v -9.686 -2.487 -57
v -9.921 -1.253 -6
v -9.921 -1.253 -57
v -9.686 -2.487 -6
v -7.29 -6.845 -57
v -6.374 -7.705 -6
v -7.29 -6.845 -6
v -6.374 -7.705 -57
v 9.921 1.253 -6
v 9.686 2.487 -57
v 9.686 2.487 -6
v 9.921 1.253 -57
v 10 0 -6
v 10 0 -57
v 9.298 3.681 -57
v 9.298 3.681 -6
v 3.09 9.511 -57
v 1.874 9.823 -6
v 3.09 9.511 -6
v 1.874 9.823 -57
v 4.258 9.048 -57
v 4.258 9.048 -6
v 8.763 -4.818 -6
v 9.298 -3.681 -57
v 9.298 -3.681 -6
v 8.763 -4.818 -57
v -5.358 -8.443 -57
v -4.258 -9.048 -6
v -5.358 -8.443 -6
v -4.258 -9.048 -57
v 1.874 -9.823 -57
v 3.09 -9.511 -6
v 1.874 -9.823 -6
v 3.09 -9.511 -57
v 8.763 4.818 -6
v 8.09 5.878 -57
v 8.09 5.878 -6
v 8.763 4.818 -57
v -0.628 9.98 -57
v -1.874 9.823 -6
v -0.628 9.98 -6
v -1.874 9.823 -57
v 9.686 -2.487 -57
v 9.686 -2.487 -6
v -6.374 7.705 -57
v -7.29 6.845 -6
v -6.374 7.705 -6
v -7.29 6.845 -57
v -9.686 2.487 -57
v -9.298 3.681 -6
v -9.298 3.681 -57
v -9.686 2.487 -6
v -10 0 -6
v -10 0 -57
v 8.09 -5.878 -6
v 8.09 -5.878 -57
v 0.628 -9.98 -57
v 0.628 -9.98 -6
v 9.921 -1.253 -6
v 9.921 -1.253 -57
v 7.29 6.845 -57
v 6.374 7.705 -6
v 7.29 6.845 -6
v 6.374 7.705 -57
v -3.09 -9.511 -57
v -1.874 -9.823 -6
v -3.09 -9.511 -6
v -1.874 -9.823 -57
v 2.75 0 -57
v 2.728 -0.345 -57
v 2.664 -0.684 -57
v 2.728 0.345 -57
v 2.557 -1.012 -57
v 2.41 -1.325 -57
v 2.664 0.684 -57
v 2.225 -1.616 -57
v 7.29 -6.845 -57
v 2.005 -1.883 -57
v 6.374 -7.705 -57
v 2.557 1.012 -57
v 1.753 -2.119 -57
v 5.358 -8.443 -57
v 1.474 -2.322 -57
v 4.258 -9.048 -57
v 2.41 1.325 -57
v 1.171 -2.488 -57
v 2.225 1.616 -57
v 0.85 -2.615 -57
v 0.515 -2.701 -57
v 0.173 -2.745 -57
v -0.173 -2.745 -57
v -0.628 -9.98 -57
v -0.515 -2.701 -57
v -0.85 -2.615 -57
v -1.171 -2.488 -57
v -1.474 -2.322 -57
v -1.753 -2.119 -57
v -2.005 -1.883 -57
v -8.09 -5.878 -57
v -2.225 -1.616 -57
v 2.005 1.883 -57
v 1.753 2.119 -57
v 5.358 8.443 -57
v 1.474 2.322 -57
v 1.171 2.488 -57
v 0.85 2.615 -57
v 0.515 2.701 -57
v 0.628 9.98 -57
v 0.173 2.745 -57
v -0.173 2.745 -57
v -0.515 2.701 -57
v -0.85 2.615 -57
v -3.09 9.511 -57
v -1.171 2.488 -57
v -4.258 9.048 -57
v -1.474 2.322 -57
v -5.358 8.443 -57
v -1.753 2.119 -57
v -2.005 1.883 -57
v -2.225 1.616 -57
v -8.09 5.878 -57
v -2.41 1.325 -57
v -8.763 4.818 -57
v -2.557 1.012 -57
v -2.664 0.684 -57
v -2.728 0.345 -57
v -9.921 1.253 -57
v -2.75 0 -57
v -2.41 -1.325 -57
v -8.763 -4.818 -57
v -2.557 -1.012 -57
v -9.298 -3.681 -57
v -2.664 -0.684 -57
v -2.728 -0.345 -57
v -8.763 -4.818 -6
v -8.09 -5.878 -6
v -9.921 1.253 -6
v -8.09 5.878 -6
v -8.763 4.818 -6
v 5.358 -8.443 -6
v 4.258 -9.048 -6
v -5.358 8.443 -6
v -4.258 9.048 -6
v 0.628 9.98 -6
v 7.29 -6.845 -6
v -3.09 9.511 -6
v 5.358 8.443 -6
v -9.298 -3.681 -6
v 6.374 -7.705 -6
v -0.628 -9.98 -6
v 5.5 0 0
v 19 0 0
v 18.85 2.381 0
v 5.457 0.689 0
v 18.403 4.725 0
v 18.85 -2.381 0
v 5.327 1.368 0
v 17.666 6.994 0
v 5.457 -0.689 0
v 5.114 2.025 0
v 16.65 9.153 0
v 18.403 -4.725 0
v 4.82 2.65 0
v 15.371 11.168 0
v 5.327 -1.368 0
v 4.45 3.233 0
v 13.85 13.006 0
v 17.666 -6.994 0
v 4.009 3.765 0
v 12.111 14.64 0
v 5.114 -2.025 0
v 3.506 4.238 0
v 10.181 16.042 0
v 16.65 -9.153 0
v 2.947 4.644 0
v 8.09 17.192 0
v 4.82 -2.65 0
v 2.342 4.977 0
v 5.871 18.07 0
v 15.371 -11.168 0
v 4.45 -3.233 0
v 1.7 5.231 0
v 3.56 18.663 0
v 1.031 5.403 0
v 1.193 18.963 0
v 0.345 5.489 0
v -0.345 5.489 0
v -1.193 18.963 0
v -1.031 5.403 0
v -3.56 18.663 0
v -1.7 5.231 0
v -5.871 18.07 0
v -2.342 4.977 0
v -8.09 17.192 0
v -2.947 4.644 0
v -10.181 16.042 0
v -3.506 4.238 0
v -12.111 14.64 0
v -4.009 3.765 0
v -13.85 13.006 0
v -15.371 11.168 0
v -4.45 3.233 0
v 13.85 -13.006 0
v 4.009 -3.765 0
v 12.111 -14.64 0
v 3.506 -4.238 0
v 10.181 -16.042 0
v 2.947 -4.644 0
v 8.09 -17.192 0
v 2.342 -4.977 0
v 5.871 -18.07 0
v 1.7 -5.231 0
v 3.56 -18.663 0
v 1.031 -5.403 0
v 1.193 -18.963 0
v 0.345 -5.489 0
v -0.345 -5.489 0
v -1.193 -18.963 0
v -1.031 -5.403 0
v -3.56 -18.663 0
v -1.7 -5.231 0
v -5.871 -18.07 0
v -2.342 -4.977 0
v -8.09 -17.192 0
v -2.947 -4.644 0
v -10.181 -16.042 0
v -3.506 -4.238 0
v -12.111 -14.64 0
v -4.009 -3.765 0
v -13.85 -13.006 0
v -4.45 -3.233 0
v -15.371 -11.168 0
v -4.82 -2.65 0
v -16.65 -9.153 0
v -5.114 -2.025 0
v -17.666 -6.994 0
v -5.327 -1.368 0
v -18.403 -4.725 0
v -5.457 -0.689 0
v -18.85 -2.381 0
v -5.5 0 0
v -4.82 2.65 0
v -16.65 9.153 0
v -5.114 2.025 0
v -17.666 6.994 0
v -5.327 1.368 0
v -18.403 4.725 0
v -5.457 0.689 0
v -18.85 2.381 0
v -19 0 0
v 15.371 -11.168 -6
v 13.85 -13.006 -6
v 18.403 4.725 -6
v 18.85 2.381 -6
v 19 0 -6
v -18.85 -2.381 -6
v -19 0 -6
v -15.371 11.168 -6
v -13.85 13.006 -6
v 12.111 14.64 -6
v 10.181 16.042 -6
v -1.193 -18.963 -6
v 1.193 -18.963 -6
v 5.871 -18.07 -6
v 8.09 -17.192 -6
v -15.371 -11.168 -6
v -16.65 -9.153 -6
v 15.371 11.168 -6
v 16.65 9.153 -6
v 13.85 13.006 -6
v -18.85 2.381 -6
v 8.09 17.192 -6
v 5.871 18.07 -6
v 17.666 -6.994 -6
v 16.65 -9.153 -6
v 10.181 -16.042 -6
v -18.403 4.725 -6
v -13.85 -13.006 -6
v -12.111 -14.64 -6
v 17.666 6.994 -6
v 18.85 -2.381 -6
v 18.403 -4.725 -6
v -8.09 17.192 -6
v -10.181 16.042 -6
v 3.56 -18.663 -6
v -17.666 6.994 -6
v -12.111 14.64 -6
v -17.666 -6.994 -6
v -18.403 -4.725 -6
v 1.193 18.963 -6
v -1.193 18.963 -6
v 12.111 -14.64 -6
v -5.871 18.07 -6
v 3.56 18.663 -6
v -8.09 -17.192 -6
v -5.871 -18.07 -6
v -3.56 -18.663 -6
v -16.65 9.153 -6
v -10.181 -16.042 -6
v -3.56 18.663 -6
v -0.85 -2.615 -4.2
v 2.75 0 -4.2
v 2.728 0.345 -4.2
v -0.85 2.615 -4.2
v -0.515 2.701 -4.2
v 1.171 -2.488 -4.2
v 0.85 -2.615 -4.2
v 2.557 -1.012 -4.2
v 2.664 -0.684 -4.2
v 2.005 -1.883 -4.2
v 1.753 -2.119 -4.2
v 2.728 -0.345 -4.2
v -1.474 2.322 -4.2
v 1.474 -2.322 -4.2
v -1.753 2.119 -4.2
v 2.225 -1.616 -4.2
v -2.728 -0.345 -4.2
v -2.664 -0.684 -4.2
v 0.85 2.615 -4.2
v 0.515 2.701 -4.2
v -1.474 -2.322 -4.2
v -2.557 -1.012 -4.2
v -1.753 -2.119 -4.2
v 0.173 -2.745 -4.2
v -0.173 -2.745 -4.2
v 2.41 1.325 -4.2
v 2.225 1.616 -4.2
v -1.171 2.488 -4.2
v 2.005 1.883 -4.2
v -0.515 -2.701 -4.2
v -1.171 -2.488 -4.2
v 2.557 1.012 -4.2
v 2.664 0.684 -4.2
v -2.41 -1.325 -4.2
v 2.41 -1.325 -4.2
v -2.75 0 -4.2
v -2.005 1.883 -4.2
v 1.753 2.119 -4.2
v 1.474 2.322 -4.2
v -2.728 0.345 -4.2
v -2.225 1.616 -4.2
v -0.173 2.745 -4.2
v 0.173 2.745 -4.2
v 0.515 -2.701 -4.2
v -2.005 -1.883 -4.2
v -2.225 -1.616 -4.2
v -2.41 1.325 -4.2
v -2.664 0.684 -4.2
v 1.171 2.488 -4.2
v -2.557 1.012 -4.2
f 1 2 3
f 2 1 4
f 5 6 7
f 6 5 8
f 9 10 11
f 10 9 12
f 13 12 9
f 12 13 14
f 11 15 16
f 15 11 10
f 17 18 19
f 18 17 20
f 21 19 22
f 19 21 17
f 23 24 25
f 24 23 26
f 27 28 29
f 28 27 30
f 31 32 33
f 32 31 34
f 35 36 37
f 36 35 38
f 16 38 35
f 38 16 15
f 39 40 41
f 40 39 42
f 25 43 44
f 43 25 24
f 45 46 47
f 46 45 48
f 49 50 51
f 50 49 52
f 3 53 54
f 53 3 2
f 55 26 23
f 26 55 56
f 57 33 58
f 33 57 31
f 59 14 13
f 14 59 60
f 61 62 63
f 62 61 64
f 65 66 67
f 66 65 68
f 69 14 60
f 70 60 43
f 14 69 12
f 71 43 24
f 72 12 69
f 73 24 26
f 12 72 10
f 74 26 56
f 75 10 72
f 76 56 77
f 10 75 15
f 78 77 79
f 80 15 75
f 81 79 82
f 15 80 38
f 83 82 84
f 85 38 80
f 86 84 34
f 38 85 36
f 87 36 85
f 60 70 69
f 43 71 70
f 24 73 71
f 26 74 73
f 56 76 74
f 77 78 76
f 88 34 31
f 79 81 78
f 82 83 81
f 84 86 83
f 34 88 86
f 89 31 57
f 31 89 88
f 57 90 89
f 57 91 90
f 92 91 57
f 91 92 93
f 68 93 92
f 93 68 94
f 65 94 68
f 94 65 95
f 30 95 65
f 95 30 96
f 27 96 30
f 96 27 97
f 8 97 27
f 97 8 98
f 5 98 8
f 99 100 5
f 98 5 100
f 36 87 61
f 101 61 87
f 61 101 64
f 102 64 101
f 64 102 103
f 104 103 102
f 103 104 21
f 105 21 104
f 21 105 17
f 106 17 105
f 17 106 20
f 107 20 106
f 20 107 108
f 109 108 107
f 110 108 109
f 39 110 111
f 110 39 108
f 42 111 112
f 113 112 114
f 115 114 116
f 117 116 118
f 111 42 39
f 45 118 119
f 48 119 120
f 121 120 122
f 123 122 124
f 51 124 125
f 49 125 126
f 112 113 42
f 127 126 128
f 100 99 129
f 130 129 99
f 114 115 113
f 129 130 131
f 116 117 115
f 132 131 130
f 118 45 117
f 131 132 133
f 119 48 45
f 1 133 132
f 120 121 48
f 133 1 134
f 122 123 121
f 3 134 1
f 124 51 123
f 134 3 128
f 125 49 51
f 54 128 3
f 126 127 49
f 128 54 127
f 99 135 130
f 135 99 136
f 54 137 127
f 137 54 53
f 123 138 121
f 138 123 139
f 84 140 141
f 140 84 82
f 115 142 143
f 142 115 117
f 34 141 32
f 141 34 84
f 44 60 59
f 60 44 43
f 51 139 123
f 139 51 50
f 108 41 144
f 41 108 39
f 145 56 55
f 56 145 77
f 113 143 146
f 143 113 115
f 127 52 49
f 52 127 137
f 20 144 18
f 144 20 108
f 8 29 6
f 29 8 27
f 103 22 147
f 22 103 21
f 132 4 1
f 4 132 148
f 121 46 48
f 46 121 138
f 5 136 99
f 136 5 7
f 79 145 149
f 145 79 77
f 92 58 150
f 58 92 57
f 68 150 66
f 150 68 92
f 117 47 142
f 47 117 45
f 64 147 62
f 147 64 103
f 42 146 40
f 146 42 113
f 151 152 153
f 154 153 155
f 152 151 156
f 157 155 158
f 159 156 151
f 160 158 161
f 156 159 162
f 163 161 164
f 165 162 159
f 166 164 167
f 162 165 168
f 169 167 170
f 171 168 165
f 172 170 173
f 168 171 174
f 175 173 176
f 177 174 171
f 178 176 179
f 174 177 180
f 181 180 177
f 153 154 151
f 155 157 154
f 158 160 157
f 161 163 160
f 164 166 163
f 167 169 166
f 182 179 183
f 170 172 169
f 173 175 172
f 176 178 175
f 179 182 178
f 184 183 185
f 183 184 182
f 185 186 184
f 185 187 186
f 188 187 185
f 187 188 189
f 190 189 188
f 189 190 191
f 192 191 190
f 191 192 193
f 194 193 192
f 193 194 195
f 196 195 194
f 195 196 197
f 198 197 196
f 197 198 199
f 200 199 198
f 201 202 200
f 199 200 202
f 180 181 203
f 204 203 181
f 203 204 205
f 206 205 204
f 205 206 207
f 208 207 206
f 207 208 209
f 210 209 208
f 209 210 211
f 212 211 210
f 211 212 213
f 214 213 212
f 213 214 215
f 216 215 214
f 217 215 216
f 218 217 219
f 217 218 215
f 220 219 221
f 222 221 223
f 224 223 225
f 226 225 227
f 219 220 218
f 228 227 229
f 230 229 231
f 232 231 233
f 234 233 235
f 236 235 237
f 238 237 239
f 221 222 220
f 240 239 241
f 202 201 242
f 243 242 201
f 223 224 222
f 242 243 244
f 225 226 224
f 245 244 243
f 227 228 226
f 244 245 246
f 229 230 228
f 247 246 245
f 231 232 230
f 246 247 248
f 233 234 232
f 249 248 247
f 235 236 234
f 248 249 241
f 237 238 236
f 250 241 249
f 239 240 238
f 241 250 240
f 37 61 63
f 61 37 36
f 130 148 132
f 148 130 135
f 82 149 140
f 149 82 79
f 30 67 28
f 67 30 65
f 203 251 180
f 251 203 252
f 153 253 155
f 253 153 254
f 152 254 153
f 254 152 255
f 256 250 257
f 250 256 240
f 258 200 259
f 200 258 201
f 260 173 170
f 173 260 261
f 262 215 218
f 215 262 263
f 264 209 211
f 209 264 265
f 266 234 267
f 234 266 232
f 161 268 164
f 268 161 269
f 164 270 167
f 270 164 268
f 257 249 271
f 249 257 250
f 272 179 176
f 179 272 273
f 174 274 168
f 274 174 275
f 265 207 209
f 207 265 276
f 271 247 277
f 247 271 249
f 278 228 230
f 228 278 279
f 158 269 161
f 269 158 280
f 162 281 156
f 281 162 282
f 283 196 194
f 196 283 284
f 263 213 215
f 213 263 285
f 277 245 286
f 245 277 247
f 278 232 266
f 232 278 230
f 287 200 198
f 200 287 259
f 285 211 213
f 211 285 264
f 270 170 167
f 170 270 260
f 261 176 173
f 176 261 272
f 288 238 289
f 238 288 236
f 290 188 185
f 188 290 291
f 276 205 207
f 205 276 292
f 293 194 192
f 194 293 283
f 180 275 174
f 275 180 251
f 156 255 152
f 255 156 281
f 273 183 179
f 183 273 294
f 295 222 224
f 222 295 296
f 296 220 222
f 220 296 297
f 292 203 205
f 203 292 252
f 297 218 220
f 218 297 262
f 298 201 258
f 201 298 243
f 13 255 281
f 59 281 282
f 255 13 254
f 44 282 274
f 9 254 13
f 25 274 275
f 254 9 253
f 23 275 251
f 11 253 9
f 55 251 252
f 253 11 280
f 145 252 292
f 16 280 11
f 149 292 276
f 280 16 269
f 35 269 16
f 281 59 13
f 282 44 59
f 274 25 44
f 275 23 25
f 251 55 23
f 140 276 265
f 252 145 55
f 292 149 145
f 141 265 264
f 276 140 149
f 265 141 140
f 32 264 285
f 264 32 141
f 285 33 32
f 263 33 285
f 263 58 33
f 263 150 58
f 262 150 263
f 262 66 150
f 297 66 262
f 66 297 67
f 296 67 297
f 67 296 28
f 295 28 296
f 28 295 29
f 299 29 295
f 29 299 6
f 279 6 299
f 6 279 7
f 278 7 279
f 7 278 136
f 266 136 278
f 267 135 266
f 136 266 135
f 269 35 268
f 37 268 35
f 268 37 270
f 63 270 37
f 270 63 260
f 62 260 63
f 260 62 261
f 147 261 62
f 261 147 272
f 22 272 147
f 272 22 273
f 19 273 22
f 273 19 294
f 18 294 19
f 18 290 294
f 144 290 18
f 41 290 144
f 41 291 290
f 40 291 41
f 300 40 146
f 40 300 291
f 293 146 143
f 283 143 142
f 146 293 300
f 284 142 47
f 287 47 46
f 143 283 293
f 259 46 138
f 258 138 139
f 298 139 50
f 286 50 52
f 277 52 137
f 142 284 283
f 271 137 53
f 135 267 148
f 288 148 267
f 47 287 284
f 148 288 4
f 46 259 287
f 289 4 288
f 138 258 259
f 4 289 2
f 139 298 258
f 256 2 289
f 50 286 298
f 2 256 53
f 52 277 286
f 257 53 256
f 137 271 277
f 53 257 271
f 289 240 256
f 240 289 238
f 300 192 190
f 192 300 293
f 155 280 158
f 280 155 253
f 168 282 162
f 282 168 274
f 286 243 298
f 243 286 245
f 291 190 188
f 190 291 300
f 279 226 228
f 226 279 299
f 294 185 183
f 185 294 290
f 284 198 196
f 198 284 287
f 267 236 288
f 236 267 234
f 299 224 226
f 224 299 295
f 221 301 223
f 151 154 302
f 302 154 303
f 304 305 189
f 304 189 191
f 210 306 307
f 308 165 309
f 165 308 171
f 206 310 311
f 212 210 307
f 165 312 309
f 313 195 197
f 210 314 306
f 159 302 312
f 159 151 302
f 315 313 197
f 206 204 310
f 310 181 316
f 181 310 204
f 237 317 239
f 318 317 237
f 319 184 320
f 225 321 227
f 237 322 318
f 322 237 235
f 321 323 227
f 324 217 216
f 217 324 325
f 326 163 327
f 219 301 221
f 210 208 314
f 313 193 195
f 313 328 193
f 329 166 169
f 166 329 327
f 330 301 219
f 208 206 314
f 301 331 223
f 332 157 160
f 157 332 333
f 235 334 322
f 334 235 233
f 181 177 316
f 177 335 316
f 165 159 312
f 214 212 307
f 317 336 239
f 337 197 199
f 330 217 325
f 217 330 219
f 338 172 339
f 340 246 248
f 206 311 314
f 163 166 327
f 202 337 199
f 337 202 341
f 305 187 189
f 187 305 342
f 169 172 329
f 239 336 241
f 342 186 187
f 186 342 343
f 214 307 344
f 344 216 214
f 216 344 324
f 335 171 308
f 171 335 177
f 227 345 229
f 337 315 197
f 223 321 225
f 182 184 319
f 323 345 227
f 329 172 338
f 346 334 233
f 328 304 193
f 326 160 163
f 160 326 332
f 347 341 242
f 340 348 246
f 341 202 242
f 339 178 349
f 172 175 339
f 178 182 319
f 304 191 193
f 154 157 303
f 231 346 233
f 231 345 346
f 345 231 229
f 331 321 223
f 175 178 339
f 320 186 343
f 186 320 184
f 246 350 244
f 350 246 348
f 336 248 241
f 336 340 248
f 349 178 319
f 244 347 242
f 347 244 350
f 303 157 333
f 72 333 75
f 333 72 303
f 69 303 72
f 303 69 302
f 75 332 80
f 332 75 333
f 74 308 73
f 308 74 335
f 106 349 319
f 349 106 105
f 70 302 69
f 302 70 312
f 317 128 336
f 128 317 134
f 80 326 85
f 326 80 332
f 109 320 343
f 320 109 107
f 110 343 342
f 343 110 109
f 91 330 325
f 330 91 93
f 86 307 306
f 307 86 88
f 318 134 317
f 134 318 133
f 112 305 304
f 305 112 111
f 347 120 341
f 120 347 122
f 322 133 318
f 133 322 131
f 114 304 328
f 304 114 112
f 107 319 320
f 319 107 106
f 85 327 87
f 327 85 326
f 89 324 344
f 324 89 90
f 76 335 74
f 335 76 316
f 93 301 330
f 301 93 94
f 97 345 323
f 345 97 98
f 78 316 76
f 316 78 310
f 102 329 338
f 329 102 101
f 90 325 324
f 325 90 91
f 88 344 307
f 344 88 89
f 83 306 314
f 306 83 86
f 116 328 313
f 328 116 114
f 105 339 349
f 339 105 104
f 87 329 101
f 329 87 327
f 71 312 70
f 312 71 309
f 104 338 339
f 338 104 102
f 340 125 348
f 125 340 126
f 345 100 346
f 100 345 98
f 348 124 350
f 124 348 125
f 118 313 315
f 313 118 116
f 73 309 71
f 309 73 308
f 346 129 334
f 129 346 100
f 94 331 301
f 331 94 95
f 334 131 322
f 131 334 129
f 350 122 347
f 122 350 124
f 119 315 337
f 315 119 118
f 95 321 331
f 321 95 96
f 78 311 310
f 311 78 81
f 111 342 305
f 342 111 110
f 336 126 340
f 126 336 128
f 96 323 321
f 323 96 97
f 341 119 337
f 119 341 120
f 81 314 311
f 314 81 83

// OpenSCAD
$fn = 50;


difference() {
	union() {
		translate(v = [0, 0, -57.0000000000]) {
			cylinder(h = 57, r = 10.0000000000);
		}
		translate(v = [0, 0, -6.0000000000]) {
			cylinder(h = 6, r = 19.0000000000);
		}
	}
	union() {
		translate(v = [0, 0, 0]) {
			rotate(a = [0, 0, 0]) {
				difference() {
					union() {
						#translate(v = [0, 0, -57.0000000000]) {
							cylinder(h = 57, r = 2.2500000000);
						}
						#translate(v = [0, 0, -4.2000000000]) {
							cylinder(h = 4.2000000000, r1 = 2.7500000000, r2 = 5.5000000000);
						}
						#translate(v = [0, 0, -57.0000000000]) {
							cylinder(h = 57, r = 2.7500000000);
						}
						#translate(v = [0, 0, -57.0000000000]) {
							cylinder(h = 57, r = 2.2500000000);
						}
					}
					union();
				}
			}
		}
	}
}
